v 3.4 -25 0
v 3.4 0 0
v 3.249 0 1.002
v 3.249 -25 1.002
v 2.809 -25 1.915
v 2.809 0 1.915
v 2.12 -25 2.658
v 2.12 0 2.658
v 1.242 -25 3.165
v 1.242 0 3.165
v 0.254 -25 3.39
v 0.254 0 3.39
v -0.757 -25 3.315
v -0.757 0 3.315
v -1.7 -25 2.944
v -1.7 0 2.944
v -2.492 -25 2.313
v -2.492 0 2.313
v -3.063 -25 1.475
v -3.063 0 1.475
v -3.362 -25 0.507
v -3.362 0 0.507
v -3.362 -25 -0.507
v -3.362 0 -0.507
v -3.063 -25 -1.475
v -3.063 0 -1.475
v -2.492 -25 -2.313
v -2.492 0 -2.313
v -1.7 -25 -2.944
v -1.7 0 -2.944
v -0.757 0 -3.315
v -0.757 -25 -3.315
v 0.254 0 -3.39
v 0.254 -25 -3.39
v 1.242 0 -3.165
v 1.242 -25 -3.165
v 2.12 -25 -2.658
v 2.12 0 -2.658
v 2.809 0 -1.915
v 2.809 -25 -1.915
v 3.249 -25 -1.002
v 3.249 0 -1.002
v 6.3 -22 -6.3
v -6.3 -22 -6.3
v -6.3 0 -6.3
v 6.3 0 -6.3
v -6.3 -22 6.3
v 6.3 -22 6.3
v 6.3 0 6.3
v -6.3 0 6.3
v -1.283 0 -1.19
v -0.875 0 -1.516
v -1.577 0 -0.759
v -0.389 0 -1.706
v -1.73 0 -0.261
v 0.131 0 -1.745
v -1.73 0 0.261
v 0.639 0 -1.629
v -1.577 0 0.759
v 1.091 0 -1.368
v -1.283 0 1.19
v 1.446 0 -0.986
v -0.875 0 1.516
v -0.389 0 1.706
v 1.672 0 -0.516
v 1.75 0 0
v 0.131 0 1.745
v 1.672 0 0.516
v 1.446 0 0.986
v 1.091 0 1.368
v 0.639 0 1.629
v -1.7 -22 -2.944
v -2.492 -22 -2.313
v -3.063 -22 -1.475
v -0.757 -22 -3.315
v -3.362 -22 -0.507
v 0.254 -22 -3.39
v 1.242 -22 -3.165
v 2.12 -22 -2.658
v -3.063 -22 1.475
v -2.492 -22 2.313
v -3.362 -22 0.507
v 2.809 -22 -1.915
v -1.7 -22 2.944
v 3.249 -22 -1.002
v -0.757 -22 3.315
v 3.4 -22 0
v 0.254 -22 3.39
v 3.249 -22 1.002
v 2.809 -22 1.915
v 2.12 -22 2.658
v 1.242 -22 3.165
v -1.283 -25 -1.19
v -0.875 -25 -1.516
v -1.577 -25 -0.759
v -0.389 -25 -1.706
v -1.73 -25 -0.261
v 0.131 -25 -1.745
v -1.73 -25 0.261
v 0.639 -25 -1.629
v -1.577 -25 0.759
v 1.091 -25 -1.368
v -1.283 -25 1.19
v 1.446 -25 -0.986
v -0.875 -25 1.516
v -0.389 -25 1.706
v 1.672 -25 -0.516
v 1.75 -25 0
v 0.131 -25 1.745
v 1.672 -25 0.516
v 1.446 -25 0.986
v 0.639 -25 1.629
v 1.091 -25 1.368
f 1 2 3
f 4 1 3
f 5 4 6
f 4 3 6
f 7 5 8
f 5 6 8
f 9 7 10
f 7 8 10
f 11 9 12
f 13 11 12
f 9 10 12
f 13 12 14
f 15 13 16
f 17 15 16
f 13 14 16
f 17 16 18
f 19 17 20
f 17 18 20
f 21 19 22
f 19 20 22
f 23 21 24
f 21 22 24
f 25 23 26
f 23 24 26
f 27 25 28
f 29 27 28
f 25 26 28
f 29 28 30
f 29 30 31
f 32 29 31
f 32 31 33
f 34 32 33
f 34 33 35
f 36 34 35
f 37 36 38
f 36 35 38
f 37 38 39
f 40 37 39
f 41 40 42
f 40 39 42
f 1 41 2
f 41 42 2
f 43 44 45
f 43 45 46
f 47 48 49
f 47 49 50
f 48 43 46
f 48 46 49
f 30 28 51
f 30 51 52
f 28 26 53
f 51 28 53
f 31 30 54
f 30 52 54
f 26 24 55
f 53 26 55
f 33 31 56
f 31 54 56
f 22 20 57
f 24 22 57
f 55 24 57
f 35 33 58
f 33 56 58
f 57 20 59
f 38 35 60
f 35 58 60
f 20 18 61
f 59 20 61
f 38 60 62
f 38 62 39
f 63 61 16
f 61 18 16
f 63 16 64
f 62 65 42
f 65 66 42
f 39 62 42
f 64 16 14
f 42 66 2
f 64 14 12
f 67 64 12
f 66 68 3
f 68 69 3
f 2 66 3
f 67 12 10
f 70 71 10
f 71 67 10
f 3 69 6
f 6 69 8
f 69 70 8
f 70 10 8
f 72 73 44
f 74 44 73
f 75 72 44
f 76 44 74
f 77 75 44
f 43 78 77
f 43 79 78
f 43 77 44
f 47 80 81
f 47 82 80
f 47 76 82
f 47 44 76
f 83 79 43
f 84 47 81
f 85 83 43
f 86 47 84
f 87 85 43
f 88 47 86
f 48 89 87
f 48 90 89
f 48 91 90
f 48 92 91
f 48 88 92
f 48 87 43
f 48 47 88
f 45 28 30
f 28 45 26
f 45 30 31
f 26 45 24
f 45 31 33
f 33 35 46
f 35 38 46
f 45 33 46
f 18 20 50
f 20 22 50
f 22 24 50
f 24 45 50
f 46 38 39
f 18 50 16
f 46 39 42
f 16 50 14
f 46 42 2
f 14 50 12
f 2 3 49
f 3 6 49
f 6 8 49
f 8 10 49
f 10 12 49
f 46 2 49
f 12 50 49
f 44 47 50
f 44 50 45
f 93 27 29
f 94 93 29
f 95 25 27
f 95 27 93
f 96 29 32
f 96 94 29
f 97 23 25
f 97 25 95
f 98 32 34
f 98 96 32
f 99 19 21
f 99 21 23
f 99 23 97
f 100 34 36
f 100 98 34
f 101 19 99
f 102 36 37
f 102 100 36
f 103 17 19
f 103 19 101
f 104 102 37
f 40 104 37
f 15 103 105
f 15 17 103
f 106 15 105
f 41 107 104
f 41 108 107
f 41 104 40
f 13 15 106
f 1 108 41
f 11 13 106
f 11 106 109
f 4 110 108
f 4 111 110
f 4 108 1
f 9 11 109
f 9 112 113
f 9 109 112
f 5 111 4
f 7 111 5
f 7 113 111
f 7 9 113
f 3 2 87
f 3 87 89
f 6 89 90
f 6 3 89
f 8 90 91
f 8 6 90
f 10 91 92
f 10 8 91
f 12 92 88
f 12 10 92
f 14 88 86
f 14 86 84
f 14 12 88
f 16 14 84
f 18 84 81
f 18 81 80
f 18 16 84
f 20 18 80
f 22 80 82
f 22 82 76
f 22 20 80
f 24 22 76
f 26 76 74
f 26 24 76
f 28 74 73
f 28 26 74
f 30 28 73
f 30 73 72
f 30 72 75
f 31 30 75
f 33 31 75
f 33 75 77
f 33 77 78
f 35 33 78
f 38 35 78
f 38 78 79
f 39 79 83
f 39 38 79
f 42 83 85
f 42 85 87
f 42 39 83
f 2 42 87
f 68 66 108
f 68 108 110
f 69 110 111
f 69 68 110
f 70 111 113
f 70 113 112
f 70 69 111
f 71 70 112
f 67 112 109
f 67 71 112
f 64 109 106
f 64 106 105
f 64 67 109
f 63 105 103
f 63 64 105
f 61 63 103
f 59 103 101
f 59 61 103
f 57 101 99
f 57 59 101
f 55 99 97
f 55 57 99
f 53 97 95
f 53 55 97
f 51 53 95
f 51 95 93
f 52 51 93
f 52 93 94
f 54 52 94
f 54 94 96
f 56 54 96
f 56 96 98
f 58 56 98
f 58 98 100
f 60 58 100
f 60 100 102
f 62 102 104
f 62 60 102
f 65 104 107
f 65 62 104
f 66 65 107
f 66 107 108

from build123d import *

# Parameters (mm, degrees)
F0_R     = 3.4
F0_R_2   = 1.75
F1_DEPTH = 25
F0_W     = 3.5
F0_H     = 1.996492
F2_DEPTH = 22


with BuildPart() as f1:
    # F0 (on Front) → F1 (new body)
    with BuildSketch(Plane.XZ):
        Circle(F0_R)
        Circle(F0_R_2, mode=Mode.SUBTRACT)
    extrude(amount=F1_DEPTH)


with BuildPart() as f2:
    # F0 (on Front) → F2 (new body)
    with BuildSketch(Plane.XZ):
        Polygon((6.3, -4.303508), (6.3, 6.3), (-3.296711, 6.3), (-6.3, 6.3), (-6.3, 4.313822), (-6.3, -6.3), (2.8, -6.3), (2.8, -4.303508), align=None)
        Circle(F0_R, mode=Mode.SUBTRACT)
        with Locations((4.55, -5.301754)):
            Rectangle(F0_W, F0_H)
    extrude(amount=F2_DEPTH)


solid = Compound([f1.part, f2.part])
